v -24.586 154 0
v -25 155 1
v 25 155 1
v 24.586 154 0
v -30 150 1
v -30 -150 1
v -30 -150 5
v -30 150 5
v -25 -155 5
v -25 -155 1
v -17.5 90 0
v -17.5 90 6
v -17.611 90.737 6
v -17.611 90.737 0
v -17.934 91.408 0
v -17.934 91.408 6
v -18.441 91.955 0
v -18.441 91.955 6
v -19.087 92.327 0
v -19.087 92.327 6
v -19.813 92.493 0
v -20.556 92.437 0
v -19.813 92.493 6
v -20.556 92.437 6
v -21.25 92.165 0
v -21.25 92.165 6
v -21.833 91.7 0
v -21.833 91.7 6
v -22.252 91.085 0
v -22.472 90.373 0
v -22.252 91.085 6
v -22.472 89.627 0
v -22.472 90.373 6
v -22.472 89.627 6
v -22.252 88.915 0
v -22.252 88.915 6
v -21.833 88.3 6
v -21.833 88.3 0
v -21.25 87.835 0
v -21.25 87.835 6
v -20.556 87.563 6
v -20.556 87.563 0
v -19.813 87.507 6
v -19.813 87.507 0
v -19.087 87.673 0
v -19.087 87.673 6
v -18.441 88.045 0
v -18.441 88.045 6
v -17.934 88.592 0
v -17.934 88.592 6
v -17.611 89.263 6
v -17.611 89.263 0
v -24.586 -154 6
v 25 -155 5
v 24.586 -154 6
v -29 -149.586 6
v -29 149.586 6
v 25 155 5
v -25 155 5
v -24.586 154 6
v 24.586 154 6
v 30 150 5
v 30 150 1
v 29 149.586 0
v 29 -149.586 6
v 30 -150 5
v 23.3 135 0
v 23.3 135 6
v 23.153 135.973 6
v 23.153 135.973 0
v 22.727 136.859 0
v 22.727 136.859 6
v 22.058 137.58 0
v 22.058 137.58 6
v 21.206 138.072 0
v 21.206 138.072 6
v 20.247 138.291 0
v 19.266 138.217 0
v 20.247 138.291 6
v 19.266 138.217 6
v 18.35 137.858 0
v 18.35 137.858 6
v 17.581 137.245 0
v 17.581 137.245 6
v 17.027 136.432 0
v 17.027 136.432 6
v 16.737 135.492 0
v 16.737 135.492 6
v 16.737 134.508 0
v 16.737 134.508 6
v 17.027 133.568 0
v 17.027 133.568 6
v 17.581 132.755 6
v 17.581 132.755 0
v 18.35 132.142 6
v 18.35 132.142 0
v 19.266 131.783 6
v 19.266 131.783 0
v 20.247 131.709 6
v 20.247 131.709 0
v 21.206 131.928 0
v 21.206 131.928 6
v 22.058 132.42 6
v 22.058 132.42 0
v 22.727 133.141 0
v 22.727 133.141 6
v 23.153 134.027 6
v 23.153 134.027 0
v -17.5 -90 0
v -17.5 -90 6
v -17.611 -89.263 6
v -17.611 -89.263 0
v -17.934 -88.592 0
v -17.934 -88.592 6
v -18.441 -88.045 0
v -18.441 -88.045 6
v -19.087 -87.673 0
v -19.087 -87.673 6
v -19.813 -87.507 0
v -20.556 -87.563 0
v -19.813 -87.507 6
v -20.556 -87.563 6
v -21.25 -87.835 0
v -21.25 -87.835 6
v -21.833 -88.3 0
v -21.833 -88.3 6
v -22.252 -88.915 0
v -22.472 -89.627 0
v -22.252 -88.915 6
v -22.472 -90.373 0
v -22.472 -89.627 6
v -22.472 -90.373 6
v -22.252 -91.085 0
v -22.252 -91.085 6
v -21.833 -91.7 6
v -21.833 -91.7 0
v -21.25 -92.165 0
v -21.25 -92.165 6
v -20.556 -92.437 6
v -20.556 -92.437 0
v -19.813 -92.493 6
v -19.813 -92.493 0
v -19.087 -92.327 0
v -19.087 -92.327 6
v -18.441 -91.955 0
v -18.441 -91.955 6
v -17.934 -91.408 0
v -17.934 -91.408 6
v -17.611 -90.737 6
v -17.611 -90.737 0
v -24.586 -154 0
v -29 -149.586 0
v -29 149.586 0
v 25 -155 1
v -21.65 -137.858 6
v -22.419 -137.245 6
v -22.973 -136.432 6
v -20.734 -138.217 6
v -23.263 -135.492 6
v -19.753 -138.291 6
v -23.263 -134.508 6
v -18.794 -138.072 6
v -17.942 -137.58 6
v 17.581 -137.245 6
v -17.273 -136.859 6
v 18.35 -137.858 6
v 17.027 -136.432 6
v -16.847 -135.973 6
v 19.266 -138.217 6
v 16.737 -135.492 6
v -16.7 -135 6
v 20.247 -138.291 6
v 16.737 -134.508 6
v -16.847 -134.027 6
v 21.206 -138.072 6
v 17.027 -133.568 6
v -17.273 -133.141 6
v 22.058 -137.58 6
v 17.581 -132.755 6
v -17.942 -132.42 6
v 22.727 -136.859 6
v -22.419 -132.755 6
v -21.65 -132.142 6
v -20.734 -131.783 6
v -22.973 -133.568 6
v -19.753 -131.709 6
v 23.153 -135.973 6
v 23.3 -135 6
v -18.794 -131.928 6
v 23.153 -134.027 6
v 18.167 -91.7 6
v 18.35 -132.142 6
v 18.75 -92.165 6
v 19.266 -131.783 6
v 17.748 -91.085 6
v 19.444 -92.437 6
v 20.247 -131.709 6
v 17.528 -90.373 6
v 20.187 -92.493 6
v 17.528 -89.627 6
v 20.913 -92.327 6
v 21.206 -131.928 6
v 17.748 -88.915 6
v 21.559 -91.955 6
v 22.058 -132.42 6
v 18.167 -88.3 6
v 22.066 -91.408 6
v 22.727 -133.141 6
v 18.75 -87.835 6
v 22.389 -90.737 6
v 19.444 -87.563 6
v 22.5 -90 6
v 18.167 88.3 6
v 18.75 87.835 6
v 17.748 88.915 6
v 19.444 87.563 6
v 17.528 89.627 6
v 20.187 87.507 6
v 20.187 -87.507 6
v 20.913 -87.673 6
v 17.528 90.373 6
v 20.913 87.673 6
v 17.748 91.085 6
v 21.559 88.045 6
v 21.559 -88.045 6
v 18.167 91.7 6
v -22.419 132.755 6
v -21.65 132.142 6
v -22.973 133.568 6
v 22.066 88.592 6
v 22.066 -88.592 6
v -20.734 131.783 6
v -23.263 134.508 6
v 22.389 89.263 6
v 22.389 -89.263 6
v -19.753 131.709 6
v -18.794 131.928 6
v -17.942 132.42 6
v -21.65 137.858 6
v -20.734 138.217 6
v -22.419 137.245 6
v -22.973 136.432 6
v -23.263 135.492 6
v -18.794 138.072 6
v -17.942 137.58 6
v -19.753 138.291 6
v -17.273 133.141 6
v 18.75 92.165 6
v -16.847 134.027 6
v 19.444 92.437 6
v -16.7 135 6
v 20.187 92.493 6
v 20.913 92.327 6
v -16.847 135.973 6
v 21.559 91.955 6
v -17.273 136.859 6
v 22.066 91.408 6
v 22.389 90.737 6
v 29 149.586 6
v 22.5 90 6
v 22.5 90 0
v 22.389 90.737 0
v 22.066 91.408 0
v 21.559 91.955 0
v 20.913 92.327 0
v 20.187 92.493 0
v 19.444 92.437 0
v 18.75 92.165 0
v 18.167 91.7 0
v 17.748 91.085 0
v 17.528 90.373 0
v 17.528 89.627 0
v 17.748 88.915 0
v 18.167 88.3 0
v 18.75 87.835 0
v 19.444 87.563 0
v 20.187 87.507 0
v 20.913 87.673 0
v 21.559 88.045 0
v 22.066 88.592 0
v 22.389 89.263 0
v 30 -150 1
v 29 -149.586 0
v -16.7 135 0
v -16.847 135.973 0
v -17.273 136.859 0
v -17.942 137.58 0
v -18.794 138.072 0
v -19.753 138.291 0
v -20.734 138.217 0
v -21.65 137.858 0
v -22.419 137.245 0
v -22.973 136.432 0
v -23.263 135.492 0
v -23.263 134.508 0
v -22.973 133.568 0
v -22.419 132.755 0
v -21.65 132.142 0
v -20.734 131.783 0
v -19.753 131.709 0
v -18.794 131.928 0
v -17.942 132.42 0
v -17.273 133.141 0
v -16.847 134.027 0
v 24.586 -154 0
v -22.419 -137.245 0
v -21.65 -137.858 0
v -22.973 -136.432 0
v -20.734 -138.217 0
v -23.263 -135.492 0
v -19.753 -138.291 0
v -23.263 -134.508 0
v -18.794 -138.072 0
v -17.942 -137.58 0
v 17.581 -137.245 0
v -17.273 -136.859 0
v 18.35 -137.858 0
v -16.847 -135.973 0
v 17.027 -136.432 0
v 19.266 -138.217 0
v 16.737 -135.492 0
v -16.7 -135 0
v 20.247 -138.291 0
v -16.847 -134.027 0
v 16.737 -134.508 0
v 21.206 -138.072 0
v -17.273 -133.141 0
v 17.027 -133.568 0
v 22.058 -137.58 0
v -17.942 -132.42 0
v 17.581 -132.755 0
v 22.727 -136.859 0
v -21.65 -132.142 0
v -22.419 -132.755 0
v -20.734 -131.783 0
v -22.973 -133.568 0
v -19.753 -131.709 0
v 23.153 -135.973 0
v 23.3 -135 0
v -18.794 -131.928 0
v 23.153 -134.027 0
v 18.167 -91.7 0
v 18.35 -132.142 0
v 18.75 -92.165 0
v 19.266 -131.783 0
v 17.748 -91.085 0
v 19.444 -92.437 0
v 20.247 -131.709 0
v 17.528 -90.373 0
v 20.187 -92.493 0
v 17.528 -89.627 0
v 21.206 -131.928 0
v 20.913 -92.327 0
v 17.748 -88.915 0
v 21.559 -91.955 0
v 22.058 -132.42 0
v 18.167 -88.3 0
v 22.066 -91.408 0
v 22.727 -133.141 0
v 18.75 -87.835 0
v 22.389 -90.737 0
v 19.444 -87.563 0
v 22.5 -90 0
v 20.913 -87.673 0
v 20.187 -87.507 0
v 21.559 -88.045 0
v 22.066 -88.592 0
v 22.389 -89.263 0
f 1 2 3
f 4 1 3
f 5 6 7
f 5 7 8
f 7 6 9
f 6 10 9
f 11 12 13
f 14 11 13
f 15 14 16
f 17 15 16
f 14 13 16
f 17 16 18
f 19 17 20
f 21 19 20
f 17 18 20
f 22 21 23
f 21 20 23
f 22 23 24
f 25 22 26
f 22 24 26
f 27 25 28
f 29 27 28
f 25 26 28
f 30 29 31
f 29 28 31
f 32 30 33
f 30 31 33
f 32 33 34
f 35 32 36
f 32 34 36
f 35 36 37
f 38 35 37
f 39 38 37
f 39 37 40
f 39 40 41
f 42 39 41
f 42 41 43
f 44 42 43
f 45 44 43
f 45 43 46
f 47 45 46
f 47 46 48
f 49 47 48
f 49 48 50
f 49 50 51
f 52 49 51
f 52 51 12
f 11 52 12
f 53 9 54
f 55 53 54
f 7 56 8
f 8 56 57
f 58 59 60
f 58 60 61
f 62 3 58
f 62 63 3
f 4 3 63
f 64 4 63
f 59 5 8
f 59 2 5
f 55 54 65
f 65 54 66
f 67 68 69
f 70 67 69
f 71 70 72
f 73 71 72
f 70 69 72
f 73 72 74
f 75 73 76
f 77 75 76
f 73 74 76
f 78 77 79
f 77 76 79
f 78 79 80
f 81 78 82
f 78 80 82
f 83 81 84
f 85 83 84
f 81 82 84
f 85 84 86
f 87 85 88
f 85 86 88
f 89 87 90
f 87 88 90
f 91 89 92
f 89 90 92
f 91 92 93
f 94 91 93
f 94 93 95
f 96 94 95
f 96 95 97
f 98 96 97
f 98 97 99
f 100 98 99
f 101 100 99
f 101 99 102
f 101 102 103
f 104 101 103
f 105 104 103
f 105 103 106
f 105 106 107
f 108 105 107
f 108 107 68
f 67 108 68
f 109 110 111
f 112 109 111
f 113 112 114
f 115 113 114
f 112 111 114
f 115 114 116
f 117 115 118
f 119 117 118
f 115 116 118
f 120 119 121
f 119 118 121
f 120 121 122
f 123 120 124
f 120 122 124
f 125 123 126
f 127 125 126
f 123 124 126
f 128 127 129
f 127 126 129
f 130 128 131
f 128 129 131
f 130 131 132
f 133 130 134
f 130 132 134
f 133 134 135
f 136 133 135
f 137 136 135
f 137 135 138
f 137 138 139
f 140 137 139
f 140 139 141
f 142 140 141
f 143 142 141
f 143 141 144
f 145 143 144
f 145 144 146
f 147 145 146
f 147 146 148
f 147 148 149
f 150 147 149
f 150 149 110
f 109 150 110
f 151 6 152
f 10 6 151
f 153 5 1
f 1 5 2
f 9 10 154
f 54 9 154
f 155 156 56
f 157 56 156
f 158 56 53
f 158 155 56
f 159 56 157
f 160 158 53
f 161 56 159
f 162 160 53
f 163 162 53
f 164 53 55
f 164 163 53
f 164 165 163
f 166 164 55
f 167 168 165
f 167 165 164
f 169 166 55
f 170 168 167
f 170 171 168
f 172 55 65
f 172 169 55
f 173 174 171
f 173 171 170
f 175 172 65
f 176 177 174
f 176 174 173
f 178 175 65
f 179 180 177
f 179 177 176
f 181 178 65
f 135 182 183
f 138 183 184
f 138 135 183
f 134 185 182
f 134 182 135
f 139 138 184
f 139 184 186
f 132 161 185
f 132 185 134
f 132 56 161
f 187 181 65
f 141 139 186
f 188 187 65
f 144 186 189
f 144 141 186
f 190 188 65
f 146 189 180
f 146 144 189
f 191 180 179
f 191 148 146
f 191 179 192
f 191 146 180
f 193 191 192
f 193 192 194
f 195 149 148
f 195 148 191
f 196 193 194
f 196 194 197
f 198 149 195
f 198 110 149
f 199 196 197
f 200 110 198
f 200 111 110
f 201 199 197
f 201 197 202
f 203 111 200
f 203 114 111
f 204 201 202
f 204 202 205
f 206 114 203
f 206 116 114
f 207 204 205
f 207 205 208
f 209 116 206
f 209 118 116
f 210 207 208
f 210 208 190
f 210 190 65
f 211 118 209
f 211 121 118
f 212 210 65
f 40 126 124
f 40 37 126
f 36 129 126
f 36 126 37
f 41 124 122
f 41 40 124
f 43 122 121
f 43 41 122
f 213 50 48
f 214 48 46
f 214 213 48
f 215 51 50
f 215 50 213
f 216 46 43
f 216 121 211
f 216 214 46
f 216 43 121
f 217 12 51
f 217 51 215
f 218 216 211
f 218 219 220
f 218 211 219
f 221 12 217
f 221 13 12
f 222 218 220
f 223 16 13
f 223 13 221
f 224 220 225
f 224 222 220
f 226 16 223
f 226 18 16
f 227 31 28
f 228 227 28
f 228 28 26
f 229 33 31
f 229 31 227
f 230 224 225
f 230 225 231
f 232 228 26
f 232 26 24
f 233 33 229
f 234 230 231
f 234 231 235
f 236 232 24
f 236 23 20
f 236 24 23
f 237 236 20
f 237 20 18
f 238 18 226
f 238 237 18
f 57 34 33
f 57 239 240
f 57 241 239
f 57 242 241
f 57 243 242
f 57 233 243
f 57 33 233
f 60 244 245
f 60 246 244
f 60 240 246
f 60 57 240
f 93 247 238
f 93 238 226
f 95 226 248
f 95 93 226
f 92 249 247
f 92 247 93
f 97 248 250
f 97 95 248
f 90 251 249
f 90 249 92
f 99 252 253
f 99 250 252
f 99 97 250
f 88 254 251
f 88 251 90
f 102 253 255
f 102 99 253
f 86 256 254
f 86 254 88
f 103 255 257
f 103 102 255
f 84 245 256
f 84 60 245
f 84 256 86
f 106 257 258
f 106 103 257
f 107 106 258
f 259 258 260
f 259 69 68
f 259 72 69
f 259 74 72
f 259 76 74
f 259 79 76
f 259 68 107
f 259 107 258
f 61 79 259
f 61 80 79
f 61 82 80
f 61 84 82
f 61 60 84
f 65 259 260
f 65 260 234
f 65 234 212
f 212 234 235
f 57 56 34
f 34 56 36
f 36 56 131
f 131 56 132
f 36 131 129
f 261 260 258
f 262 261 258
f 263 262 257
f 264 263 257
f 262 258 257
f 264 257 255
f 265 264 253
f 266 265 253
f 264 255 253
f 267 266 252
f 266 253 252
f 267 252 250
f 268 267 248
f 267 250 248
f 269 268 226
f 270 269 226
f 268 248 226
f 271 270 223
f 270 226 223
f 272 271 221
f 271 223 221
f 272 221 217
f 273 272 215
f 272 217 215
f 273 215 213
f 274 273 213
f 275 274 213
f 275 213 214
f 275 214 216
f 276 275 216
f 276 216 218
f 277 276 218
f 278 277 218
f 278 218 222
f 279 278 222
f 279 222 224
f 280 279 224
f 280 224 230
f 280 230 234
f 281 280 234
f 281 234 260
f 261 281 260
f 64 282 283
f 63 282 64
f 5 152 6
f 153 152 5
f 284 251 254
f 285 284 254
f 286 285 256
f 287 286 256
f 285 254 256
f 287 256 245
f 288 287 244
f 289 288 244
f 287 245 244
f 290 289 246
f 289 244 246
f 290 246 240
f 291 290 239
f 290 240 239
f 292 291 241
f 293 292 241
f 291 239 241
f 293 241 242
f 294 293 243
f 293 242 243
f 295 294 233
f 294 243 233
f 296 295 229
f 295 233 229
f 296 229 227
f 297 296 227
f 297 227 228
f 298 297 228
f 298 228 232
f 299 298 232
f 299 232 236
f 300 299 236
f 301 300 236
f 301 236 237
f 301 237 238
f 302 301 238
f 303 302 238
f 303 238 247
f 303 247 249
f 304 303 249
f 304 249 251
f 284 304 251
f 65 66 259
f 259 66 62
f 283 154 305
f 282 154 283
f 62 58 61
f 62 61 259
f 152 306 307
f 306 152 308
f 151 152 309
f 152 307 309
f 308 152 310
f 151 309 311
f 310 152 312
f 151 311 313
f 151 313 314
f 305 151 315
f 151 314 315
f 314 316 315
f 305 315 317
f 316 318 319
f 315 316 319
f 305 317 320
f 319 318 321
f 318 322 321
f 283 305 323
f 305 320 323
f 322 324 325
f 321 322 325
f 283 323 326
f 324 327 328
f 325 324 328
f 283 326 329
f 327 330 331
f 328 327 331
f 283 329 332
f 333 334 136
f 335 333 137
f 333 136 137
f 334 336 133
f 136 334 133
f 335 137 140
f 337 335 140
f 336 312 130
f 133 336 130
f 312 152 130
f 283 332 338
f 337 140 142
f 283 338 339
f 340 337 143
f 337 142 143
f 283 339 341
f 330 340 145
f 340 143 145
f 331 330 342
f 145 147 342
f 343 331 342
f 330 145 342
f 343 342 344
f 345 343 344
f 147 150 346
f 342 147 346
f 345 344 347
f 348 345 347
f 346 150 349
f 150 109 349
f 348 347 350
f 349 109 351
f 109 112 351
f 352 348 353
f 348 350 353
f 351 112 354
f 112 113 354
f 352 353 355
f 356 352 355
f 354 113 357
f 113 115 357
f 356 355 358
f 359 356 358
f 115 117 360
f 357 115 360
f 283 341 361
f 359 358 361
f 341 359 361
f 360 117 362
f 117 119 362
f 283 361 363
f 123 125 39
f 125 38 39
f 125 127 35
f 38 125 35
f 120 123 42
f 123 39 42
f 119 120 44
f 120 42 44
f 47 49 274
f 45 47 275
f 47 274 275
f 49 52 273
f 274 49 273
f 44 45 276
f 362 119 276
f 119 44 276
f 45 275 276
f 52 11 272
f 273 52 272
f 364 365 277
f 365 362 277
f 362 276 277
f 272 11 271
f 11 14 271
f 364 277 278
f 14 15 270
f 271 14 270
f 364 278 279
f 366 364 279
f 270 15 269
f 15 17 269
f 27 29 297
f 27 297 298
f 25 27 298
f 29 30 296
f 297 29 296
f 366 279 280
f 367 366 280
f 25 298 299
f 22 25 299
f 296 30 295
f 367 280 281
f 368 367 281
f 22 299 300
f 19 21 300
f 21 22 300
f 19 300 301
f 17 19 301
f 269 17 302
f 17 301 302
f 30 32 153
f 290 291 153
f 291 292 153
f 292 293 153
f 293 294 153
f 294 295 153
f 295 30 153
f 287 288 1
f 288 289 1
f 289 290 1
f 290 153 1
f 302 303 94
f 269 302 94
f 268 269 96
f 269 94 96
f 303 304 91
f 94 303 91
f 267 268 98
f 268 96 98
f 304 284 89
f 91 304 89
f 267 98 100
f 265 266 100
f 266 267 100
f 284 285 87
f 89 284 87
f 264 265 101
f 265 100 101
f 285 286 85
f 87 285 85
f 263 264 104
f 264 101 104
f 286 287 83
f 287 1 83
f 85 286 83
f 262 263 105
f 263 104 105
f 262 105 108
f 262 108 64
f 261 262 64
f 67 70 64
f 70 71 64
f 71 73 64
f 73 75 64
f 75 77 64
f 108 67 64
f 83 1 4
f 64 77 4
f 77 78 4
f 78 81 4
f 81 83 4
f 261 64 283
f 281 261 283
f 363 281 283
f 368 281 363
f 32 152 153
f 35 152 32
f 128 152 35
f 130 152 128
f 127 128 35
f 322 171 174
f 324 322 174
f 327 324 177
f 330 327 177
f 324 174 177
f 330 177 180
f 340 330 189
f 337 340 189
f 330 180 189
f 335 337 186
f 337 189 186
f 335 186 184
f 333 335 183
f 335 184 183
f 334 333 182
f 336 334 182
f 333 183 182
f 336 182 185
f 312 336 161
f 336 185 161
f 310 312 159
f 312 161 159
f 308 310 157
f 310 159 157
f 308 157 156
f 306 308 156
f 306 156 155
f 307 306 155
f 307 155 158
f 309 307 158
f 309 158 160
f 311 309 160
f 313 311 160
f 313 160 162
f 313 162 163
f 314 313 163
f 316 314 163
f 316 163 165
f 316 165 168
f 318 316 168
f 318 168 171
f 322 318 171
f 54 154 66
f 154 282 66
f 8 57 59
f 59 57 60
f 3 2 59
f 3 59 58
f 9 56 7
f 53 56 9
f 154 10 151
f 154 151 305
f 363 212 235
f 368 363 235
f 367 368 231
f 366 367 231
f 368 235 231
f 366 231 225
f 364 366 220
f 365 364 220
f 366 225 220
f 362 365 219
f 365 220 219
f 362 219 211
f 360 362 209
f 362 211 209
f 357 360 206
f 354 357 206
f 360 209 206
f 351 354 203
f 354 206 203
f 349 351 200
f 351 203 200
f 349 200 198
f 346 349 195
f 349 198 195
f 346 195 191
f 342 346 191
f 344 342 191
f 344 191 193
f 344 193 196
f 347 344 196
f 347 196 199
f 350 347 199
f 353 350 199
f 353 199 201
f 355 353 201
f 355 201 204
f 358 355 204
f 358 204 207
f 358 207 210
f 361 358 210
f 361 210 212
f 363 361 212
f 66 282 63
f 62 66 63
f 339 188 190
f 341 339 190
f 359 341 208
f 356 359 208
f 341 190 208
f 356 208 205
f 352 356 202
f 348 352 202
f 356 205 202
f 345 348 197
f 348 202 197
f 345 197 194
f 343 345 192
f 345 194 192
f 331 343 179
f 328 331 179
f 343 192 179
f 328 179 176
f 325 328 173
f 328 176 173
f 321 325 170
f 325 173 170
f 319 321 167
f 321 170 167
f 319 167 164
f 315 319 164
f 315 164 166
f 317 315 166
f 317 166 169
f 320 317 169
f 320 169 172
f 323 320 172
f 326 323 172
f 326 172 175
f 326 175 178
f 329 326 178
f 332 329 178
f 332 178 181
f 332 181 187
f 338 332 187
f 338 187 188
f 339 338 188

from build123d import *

# Parameters (mm, degrees)
SKETCH_1_W             = 60
SKETCH_1_H             = 310
EXTRUDE_1_DEPTH        = 6
SKETCH_2_R             = 3.3
CUT_EXTRUDE_1_DEPTH    = 158.990506044
CHAMFER_2_SIZE         = 5
CHAMFER_1_SIZE         = 1
HOLE_WIZARD_M6_1_D     = 5
HOLE_WIZARD_M6_1_DEPTH = 19.75
HOLE_WIZARD_M6_1_TIP   = 1.502151548


with BuildPart() as part:
    # 草图1 → 凸台-拉伸1 (new body)
    with BuildSketch(Plane.XY):
        Rectangle(SKETCH_1_W, SKETCH_1_H)
    extrude(amount=EXTRUDE_1_DEPTH)

    # 草图2 → 切除-拉伸1 (cut, through all)
    with BuildSketch(Plane.XY.offset(6)):
        with Locations((-20, 135)):
            Circle(SKETCH_2_R)
        with Locations((20, 135)):
            Circle(SKETCH_2_R)
        with Locations((-20, -135)):
            Circle(SKETCH_2_R)
        with Locations((20, -135)):
            Circle(SKETCH_2_R)
    extrude(amount=-CUT_EXTRUDE_1_DEPTH, mode=Mode.SUBTRACT)

    # 倒角2
    chamfer_2_edges = [part.edges().sort_by_distance(p)[0] for p in [
        (30, -155, 3),
        (-30, -155, 3),
        (-30, 155, 3),
        (30, 155, 3),
    ]]
    chamfer(chamfer_2_edges, length=CHAMFER_2_SIZE)

    # 倒角1
    chamfer_1_edges = [part.edges().sort_by_distance(p)[0] for p in [
        (0, -155, 0),
        (0, -155, 6),
        (30, 0, 0),
        (-30, 0, 0),
        (0, 155, 0),
        (27.5, 152.5, 0),
        (-27.5, 152.5, 0),
        (27.5, -152.5, 0),
        (-27.5, -152.5, 0),
        (-30, 0, 6),
        (30, 0, 6),
        (0, 155, 6),
        (27.5, 152.5, 6),
        (-27.5, 152.5, 6),
        (27.5, -152.5, 6),
        (-27.5, -152.5, 6),
    ]]
    chamfer(chamfer_1_edges, length=CHAMFER_1_SIZE)

    # M6 螺纹孔1
    with Locations(Plane(origin=(0, 0, 0), x_dir=(-1, 0, 0), z_dir=(0, 0, -1))):
        with Locations((-20, 89.999999889), (20, 89.999999889), (20, -90.000000111), (-20, -90.000000111)):
            Hole(HOLE_WIZARD_M6_1_D / 2, depth=HOLE_WIZARD_M6_1_DEPTH)
            with Locations((0, 0, -(HOLE_WIZARD_M6_1_DEPTH + HOLE_WIZARD_M6_1_TIP / 2))):  # 118° drill point
                Cone(0, HOLE_WIZARD_M6_1_D / 2, HOLE_WIZARD_M6_1_TIP, mode=Mode.SUBTRACT)


solid = part.part
